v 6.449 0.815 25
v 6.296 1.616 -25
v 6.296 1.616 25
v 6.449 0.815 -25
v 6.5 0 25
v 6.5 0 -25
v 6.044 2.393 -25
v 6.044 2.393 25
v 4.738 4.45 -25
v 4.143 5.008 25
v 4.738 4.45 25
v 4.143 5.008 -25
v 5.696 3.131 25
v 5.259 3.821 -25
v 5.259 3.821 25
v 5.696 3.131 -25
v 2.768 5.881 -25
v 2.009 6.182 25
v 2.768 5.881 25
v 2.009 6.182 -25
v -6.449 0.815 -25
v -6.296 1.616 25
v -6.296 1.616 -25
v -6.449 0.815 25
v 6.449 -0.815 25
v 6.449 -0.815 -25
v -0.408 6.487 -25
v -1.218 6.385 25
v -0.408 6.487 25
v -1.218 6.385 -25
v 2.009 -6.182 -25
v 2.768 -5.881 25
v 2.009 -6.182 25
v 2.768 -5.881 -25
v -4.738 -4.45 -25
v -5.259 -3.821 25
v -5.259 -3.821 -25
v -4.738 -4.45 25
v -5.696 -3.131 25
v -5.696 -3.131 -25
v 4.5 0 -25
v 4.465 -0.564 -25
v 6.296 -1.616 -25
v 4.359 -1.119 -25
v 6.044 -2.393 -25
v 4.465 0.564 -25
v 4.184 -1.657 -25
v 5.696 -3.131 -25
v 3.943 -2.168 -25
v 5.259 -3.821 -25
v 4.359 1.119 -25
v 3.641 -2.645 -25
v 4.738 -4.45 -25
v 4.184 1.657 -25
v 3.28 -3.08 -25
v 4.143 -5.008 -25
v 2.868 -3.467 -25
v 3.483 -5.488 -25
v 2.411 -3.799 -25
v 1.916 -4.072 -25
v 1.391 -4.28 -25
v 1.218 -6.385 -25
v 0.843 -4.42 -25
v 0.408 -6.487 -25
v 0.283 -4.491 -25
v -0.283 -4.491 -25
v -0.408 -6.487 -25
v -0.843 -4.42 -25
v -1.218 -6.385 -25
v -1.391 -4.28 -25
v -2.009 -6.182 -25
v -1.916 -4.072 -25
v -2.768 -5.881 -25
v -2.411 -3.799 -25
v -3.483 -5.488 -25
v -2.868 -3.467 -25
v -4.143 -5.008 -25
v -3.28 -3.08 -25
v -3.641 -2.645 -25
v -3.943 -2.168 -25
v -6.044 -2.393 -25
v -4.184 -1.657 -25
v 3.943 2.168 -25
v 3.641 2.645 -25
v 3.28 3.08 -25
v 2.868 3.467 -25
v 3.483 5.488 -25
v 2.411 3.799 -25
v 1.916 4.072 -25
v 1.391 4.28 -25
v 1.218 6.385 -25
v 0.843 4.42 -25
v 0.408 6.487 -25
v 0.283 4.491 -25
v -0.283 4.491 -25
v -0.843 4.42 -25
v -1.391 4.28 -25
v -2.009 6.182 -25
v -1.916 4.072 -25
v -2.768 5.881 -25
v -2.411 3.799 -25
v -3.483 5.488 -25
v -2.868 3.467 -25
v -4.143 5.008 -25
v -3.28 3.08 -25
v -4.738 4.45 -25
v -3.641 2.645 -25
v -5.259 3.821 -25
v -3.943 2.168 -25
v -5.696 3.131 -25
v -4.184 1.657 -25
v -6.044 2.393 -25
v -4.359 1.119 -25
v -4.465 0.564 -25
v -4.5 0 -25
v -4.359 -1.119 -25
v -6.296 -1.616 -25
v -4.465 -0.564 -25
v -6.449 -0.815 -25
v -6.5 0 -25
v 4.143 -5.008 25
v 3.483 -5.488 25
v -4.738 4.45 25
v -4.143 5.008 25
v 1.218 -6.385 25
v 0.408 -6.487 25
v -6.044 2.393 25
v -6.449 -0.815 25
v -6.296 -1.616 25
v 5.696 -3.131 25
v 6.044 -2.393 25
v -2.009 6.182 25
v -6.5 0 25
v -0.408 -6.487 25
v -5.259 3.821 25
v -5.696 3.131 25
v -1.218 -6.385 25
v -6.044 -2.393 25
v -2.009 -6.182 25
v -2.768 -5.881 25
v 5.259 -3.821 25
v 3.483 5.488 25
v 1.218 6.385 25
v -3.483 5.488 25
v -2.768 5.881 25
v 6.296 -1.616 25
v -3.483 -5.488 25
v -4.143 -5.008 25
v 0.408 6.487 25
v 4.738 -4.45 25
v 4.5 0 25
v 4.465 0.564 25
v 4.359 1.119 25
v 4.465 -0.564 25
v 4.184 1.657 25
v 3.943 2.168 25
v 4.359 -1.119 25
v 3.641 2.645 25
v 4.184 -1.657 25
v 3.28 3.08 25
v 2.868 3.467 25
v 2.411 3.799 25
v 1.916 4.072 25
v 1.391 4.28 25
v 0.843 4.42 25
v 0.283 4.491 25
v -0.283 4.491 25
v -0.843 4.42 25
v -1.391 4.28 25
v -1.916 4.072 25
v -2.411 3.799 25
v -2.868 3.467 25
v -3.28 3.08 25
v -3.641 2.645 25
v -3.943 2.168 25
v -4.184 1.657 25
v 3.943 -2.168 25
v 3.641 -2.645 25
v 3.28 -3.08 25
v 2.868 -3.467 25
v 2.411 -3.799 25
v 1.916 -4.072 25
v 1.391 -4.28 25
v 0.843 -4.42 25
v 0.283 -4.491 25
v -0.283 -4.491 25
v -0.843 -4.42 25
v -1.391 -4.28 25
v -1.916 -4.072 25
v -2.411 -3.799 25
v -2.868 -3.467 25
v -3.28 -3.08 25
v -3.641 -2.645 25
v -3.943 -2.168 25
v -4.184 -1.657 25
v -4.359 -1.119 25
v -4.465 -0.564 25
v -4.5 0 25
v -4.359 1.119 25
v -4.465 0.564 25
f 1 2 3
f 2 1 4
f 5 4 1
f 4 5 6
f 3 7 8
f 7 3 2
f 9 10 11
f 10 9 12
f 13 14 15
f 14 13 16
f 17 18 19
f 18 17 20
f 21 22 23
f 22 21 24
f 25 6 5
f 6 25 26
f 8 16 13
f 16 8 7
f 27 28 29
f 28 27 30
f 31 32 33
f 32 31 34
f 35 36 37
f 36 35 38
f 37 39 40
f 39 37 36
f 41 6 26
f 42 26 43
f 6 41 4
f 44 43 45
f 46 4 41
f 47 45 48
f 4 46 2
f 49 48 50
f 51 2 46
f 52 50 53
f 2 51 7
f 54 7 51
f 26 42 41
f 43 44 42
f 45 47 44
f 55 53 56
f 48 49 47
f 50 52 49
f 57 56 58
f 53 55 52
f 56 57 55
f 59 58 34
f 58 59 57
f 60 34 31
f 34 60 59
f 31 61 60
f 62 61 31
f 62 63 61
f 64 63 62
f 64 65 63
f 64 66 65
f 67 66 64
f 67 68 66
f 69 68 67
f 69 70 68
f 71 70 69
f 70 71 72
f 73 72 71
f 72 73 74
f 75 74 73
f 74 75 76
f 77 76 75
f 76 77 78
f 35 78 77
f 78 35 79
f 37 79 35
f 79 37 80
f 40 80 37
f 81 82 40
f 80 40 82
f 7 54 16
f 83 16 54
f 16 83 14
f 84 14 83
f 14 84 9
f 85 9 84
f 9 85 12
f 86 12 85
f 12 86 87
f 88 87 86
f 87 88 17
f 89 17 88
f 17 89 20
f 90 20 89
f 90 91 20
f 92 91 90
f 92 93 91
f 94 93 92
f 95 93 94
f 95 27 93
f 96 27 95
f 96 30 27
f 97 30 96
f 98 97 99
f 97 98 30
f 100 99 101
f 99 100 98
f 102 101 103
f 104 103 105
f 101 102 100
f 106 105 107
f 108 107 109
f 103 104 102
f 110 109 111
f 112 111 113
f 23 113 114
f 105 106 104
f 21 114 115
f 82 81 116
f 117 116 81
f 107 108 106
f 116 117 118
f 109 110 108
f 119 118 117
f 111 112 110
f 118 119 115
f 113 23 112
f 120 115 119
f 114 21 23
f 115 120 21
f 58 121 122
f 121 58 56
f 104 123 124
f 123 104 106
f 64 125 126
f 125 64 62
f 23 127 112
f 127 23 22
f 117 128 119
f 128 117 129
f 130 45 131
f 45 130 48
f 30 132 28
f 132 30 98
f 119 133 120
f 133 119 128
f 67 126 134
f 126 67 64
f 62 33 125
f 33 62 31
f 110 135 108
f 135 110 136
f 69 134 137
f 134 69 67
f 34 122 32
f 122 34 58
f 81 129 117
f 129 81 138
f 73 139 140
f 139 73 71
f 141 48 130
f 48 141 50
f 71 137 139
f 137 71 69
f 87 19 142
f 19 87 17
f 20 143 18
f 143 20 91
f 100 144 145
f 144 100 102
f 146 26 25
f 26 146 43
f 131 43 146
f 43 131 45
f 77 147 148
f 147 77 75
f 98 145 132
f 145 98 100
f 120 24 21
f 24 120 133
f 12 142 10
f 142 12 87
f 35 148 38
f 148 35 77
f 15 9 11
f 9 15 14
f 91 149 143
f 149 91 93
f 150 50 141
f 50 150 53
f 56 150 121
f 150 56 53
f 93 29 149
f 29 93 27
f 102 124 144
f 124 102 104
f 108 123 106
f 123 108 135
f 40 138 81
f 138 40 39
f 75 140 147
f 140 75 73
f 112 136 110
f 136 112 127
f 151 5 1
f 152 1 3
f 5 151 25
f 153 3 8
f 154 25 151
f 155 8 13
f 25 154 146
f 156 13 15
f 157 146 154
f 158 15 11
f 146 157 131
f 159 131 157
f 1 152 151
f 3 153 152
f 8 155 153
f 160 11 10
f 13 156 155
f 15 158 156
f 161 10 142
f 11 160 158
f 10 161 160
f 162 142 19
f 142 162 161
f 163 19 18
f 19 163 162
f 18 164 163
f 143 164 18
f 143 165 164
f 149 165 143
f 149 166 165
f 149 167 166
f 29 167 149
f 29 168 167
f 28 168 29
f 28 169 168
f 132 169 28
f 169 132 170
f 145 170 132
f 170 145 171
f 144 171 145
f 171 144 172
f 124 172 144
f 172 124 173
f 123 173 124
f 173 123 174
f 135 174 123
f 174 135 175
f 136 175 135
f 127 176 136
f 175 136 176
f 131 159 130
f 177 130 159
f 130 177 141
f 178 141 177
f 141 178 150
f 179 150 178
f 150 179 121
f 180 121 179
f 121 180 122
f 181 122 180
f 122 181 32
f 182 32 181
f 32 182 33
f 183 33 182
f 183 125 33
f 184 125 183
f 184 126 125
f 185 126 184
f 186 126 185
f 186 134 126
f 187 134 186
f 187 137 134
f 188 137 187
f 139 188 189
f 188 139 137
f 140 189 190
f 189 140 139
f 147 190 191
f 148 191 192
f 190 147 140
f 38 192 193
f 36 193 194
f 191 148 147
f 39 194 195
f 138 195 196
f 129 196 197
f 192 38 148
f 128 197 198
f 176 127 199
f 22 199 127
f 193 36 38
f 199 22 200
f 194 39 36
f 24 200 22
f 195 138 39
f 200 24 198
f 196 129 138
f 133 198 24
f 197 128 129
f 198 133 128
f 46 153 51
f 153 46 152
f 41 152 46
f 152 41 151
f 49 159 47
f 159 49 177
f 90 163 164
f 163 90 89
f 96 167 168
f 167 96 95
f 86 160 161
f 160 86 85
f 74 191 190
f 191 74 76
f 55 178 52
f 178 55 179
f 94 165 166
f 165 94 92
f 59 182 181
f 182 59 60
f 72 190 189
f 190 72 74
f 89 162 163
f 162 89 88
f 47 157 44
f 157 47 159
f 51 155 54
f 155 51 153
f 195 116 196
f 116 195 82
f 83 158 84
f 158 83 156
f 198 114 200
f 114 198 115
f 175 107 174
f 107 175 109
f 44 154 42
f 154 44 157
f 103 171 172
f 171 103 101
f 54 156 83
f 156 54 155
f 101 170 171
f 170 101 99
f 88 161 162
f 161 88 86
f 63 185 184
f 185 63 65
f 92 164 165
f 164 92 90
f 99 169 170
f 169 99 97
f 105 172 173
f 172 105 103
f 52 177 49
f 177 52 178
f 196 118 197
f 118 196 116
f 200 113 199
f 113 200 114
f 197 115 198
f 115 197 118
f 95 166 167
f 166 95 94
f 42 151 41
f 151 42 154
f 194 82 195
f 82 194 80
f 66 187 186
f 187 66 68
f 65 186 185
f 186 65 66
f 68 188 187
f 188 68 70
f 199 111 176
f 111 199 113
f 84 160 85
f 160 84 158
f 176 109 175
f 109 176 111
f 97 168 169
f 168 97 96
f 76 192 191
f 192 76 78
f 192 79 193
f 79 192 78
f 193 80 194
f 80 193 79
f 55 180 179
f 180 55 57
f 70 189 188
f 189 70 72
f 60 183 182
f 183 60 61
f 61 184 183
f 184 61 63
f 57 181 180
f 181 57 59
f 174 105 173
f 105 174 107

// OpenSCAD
$fn = 50;


difference() {
	union() {
		translate(v = [0, 0, -25.0000000000]) {
			cylinder(h = 50, r = 6.5000000000);
		}
	}
	union() {
		translate(v = [0, 0, -100.0000000000]) {
			cylinder(h = 200, r = 4.5000000000);
		}
	}
}
